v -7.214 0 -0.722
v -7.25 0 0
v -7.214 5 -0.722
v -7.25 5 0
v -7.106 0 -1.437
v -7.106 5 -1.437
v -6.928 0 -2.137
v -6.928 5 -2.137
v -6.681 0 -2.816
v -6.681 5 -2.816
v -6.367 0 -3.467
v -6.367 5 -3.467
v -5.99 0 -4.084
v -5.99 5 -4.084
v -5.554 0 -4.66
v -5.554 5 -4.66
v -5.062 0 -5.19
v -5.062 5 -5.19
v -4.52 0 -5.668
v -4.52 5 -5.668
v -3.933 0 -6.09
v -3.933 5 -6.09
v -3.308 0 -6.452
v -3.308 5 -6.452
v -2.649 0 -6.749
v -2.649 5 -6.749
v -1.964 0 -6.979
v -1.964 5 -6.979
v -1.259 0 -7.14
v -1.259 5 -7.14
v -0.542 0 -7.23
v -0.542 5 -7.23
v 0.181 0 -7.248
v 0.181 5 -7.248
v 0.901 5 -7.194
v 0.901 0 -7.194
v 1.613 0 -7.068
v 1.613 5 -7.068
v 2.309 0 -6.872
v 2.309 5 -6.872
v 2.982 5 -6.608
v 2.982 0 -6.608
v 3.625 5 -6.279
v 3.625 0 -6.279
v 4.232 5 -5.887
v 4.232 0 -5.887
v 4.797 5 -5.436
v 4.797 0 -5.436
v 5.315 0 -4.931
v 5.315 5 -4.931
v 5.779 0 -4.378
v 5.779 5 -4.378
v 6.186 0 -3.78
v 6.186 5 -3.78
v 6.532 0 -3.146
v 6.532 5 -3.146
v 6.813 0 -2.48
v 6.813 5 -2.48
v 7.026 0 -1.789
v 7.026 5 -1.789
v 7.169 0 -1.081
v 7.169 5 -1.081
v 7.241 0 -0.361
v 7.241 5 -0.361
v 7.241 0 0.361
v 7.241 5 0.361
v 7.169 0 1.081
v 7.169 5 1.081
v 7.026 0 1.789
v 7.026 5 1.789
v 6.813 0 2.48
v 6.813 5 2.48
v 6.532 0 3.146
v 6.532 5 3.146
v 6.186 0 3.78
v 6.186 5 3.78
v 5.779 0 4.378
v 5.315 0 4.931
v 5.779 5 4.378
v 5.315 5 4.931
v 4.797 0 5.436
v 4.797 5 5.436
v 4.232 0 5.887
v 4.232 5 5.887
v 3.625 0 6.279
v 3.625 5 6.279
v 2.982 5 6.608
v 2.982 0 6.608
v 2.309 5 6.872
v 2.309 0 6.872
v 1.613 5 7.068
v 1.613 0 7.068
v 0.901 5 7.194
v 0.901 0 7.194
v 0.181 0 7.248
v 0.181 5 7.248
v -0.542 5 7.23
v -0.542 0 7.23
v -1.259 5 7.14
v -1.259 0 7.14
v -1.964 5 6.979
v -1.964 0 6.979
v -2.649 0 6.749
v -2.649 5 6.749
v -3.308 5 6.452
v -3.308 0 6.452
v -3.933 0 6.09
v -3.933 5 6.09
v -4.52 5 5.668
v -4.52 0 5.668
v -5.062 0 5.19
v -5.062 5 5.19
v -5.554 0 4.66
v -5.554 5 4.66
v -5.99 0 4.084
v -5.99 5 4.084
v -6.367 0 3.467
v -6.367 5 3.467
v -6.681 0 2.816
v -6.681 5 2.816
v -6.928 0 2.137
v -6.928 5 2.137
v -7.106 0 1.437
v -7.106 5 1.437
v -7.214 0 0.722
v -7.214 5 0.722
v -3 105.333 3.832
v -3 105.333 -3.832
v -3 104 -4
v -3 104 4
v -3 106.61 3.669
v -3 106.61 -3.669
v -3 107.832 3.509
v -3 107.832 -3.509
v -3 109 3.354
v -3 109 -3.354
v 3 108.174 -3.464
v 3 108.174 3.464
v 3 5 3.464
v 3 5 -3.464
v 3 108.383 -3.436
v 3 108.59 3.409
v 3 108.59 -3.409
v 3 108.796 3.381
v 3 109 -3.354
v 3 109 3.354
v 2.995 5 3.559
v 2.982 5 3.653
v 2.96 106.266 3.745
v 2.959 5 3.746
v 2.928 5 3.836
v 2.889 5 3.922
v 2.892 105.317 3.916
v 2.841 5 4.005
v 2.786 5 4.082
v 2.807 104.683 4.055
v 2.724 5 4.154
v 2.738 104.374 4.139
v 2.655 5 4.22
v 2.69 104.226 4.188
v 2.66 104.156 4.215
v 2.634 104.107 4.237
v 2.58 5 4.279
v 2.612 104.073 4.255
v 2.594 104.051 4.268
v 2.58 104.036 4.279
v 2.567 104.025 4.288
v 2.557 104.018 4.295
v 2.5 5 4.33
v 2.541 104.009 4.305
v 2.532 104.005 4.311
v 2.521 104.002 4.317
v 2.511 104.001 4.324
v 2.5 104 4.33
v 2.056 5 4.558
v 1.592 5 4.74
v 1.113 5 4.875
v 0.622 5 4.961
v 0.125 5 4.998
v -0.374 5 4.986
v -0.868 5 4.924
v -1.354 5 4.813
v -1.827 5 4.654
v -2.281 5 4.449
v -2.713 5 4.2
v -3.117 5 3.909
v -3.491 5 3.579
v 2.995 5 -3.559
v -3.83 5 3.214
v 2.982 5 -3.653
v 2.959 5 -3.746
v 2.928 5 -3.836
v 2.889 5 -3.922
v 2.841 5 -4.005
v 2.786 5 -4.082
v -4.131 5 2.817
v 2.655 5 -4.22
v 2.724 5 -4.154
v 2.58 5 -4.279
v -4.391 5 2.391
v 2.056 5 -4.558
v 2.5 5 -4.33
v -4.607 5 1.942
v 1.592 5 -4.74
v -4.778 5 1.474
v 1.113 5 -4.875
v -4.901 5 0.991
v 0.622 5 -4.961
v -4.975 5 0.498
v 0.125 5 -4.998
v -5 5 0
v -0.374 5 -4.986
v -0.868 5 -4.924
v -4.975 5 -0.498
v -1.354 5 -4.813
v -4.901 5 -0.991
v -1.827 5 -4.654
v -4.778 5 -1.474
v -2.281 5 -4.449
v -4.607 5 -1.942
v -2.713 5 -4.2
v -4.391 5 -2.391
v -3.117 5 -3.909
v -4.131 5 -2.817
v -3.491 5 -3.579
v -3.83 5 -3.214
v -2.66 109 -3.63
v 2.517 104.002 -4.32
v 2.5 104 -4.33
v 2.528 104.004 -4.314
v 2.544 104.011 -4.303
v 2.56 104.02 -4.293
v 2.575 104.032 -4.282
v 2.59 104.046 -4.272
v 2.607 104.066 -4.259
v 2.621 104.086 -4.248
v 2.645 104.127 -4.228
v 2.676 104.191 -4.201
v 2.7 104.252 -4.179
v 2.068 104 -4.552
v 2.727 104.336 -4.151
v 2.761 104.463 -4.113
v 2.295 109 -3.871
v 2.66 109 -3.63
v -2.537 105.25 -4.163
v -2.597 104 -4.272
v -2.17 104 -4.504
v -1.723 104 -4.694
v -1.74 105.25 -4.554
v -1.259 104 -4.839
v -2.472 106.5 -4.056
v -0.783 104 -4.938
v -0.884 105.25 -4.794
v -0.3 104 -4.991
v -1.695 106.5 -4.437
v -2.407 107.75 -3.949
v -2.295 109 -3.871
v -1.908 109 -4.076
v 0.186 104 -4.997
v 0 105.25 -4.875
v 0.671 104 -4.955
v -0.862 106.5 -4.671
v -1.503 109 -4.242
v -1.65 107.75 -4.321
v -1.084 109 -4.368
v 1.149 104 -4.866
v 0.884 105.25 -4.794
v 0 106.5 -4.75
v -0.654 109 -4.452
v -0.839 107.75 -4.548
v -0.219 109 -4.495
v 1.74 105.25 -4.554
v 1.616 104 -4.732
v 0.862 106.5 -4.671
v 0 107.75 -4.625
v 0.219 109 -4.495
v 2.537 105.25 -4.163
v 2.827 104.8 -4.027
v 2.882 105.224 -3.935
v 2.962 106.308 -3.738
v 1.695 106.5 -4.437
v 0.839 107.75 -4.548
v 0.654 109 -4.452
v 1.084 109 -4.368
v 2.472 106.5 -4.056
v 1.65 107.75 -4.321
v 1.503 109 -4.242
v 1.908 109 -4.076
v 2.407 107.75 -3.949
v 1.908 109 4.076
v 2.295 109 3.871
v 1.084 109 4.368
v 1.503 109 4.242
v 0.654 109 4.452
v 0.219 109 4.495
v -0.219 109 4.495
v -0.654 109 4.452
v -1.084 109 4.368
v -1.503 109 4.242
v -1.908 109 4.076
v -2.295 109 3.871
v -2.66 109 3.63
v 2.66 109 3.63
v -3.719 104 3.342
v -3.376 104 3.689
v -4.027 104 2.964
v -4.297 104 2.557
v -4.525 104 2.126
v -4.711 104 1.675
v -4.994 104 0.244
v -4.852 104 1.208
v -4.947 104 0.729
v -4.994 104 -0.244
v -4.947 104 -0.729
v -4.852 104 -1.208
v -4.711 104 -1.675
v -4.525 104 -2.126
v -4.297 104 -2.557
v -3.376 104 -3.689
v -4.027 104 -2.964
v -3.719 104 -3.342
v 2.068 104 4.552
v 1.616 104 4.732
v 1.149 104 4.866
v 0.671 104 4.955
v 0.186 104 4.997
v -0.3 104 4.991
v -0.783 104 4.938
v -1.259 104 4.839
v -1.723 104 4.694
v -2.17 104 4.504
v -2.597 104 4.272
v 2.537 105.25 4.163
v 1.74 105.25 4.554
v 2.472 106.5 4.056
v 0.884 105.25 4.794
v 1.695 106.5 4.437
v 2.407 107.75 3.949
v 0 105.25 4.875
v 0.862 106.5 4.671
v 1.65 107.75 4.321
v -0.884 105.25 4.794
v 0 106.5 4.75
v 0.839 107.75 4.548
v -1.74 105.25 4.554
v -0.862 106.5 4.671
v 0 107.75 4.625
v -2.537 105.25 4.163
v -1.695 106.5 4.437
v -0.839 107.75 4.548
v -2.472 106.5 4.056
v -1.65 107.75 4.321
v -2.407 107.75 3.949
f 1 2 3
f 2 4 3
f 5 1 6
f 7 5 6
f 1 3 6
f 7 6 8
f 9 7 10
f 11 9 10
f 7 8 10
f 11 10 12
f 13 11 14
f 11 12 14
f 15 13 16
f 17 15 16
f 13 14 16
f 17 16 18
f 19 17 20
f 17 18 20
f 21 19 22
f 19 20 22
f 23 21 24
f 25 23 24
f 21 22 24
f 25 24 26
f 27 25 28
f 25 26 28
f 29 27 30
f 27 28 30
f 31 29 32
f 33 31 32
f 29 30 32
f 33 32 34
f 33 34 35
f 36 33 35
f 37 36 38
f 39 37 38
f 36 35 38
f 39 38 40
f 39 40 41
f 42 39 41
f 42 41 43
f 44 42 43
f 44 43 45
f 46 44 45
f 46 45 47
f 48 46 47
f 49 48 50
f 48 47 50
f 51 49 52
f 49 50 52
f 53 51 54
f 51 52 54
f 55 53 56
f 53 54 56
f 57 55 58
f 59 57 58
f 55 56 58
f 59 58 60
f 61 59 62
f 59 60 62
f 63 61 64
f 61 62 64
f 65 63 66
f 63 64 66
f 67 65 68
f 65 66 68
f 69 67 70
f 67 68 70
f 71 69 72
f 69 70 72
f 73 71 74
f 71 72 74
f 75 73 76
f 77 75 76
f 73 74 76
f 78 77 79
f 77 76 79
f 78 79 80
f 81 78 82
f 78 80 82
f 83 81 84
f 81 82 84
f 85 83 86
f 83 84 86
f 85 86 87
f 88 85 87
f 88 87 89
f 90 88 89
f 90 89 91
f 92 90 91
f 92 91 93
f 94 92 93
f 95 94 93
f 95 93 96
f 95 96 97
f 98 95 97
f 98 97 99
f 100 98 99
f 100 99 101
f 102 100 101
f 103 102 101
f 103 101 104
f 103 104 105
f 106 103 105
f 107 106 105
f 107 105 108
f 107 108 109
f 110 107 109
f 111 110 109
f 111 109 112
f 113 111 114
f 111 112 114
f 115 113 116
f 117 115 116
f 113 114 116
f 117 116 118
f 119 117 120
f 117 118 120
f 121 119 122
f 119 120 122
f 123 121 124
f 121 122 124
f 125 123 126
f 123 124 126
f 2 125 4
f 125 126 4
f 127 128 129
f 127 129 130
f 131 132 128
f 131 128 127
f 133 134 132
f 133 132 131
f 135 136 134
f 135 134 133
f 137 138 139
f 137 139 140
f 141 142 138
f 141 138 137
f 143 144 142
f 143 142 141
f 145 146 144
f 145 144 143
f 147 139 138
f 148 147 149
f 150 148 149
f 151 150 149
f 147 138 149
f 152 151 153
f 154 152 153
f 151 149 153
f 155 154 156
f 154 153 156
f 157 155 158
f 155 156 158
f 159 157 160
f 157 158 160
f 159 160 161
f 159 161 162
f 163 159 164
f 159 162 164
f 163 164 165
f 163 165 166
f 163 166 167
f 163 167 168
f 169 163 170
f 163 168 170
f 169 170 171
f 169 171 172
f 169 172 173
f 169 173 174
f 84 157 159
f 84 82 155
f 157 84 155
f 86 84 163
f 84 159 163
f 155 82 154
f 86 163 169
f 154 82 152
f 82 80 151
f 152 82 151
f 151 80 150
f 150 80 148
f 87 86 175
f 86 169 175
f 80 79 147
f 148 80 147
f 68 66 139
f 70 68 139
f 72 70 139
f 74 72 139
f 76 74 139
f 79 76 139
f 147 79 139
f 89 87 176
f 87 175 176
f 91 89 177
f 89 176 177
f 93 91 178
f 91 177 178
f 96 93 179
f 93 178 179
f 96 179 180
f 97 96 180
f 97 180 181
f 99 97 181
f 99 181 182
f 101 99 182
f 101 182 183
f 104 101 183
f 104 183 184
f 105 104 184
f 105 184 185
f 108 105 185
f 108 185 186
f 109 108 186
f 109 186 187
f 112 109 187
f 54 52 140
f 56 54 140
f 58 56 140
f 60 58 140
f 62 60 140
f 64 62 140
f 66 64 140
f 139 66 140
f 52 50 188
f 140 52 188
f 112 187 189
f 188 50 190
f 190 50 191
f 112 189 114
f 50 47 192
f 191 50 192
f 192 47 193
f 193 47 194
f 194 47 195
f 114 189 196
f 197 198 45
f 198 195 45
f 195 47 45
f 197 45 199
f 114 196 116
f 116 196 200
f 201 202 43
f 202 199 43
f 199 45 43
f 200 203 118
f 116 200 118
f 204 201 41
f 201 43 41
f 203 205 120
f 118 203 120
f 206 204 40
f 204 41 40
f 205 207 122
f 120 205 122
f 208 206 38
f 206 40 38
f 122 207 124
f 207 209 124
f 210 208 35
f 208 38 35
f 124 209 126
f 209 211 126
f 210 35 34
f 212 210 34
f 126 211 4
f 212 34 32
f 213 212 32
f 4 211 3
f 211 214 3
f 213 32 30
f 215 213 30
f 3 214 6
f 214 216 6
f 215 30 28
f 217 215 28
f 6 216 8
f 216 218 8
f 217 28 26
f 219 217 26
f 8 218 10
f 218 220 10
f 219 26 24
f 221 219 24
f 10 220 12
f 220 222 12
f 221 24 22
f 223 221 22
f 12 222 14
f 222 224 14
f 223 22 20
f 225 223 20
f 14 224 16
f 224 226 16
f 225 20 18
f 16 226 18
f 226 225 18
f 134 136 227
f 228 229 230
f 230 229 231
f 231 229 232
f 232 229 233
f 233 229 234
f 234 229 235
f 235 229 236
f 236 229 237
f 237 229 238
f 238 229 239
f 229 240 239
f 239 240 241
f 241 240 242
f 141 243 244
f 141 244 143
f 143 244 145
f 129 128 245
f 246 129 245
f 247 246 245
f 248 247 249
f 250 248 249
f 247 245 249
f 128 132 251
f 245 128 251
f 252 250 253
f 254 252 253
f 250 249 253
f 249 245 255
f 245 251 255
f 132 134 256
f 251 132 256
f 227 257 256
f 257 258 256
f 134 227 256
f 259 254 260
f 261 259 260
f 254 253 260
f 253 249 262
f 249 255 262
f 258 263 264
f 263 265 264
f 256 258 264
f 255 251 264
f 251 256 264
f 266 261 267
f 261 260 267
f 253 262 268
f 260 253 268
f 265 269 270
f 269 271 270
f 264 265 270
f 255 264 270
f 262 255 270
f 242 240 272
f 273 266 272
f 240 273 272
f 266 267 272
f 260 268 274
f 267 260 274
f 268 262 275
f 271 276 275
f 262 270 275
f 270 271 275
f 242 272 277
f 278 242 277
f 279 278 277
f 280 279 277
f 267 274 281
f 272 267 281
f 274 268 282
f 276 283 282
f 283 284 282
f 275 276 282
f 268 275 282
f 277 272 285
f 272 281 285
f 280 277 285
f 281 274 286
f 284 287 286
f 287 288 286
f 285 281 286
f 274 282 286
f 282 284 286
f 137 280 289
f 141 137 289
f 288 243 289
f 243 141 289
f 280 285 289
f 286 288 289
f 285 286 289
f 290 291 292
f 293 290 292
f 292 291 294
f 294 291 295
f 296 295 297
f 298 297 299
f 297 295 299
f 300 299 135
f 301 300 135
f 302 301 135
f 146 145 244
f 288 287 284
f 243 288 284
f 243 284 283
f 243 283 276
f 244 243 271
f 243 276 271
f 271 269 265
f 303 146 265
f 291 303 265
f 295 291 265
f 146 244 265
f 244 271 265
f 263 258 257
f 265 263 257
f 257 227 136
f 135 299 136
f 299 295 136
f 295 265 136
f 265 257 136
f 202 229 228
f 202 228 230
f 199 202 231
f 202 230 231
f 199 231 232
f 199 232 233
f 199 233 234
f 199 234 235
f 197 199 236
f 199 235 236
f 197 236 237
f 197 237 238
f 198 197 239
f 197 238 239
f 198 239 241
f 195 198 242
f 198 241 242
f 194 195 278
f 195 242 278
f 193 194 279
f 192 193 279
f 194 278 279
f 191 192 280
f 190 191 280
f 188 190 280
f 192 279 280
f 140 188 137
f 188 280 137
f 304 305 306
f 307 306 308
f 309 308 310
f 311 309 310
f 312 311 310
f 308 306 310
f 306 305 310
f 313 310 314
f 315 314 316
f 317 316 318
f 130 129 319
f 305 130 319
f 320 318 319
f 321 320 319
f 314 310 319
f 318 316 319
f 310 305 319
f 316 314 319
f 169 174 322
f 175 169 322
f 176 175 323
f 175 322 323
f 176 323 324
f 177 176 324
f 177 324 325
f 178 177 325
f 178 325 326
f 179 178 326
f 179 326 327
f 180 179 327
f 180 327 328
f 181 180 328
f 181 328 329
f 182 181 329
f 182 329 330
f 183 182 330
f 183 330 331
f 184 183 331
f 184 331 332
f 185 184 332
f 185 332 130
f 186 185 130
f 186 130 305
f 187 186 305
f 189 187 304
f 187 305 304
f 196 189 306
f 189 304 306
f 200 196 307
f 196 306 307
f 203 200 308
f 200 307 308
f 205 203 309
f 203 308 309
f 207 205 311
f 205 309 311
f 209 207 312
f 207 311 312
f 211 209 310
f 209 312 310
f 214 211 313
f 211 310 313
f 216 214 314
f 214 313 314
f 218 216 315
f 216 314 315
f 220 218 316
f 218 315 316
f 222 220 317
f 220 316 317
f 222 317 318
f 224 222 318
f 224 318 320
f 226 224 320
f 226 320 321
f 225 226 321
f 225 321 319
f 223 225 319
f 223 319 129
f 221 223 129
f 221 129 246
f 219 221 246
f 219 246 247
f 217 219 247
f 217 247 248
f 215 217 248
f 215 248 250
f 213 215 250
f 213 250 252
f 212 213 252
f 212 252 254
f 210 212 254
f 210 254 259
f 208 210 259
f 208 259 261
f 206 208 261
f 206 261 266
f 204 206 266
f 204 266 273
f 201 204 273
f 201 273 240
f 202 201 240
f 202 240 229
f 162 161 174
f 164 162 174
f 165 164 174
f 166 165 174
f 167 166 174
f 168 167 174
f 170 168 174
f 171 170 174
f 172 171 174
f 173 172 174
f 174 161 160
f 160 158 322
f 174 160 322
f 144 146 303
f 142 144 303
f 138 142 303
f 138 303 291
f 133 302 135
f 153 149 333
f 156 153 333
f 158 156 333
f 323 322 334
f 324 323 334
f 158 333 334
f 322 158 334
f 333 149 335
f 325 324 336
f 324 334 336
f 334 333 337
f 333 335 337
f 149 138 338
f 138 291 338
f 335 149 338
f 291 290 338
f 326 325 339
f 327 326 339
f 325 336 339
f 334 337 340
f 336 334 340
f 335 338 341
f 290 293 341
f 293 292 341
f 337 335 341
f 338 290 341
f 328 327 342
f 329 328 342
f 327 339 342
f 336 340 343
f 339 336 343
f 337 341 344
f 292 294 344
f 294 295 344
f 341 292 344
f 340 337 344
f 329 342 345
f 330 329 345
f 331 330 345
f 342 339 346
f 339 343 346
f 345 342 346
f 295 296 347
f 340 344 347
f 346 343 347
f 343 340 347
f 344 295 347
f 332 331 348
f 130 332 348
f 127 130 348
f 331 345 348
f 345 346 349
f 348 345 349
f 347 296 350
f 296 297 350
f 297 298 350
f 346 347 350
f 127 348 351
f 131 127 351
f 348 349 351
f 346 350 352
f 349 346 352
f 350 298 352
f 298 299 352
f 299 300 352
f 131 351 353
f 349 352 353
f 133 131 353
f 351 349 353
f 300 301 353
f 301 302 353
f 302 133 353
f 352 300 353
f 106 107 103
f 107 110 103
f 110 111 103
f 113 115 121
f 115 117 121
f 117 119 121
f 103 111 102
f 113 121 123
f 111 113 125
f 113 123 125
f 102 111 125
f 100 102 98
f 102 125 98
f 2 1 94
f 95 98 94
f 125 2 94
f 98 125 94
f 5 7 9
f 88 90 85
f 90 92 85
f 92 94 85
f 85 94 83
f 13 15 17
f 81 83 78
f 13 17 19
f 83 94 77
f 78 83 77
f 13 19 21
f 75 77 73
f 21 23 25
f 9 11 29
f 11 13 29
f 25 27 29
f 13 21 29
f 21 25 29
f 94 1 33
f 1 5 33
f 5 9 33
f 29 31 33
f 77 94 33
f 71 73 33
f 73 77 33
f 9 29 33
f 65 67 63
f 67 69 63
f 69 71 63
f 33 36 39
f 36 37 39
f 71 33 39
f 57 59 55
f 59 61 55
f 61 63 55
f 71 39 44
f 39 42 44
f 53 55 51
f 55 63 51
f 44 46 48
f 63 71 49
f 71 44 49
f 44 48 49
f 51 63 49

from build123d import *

# Parameters (mm, degrees)
CUT_EXTRUDE1_DEPTH = 5
CUT_EXTRUDE2_DEPTH = 99
FILLET1_R          = 1


with BuildPart() as part:
    # Sketch5 → Revolve1 (revolve)
    with BuildSketch(Plane.XY, mode=Mode.PRIVATE) as revolve1_sk:
        Polygon((0, 0), (7.25, 0), (7.25, 5), (5, 5), (5, 104), (4.5, 109), (0, 109), align=None)
    revolve(revolve1_sk.sketch.rotate(Axis((0, 109, 0), (0, -1, 0)), 180), axis=Axis((0, 109, 0), (0, -1, 0)))

    # Sketch6 → Cut-Extrude1 (cut)
    with BuildSketch(Plane(origin=(0, 109, 0), x_dir=(1, 0, 0), z_dir=(0, 1, 0))):
        with BuildLine():
            Line((3, 4), (3, -4))
            ThreePointArc((3, -4), (5, 0), (3, 4))
        make_face()
        with BuildLine():
            Line((-3, 4), (-3, -4))
            ThreePointArc((-3, -4), (-5, 0), (-3, 4))
        make_face()
    extrude(amount=-CUT_EXTRUDE1_DEPTH, mode=Mode.SUBTRACT)

    # Sketch7 → Cut-Extrude2 (cut)
    with BuildSketch(Plane(origin=(0, 104, 0), x_dir=(1, 0, 0), z_dir=(0, 1, 0))):
        with BuildLine():
            Line((3, -4), (3, 4))
            ThreePointArc((3, 4), (5, 0), (3, -4))
        make_face()
    extrude(amount=-CUT_EXTRUDE2_DEPTH, mode=Mode.SUBTRACT)

    # Fillet1
    # the kernel refuses this fillet: 1 mm, written as the material it takes off along each edge
    with BuildSketch(Plane(origin=(3, 108.493644566, 4), x_dir=(0, 0, -1), z_dir=(0, -1, 0))) as fillet1_piece_1:
        with BuildLine():
            CenterArc((0.535898385, -1), FILLET1_R, 90, 60)
            ThreePointArc((-0.330127019, -0.5), (-0.172559651, -0.245050643), (0, 0))
            Line((0, 0), (0.535898385, 0))
        make_face()
    extrude(amount=103.493644566, mode=Mode.SUBTRACT)
    with BuildSketch(Plane(origin=(3, 108.493644566, -4), x_dir=(0, 0, 1), z_dir=(0, -1, 0))) as fillet1_piece_2:
        with BuildLine():
            CenterArc((0.535898385, 1), FILLET1_R, 210, 60)
            ThreePointArc((-0.330127019, 0.5), (-0.172559651, 0.245050643), (0, 0))
            Line((0, 0), (0.535898385, 0))
        make_face()
    extrude(amount=103.493644566, mode=Mode.SUBTRACT)


solid = part.part
